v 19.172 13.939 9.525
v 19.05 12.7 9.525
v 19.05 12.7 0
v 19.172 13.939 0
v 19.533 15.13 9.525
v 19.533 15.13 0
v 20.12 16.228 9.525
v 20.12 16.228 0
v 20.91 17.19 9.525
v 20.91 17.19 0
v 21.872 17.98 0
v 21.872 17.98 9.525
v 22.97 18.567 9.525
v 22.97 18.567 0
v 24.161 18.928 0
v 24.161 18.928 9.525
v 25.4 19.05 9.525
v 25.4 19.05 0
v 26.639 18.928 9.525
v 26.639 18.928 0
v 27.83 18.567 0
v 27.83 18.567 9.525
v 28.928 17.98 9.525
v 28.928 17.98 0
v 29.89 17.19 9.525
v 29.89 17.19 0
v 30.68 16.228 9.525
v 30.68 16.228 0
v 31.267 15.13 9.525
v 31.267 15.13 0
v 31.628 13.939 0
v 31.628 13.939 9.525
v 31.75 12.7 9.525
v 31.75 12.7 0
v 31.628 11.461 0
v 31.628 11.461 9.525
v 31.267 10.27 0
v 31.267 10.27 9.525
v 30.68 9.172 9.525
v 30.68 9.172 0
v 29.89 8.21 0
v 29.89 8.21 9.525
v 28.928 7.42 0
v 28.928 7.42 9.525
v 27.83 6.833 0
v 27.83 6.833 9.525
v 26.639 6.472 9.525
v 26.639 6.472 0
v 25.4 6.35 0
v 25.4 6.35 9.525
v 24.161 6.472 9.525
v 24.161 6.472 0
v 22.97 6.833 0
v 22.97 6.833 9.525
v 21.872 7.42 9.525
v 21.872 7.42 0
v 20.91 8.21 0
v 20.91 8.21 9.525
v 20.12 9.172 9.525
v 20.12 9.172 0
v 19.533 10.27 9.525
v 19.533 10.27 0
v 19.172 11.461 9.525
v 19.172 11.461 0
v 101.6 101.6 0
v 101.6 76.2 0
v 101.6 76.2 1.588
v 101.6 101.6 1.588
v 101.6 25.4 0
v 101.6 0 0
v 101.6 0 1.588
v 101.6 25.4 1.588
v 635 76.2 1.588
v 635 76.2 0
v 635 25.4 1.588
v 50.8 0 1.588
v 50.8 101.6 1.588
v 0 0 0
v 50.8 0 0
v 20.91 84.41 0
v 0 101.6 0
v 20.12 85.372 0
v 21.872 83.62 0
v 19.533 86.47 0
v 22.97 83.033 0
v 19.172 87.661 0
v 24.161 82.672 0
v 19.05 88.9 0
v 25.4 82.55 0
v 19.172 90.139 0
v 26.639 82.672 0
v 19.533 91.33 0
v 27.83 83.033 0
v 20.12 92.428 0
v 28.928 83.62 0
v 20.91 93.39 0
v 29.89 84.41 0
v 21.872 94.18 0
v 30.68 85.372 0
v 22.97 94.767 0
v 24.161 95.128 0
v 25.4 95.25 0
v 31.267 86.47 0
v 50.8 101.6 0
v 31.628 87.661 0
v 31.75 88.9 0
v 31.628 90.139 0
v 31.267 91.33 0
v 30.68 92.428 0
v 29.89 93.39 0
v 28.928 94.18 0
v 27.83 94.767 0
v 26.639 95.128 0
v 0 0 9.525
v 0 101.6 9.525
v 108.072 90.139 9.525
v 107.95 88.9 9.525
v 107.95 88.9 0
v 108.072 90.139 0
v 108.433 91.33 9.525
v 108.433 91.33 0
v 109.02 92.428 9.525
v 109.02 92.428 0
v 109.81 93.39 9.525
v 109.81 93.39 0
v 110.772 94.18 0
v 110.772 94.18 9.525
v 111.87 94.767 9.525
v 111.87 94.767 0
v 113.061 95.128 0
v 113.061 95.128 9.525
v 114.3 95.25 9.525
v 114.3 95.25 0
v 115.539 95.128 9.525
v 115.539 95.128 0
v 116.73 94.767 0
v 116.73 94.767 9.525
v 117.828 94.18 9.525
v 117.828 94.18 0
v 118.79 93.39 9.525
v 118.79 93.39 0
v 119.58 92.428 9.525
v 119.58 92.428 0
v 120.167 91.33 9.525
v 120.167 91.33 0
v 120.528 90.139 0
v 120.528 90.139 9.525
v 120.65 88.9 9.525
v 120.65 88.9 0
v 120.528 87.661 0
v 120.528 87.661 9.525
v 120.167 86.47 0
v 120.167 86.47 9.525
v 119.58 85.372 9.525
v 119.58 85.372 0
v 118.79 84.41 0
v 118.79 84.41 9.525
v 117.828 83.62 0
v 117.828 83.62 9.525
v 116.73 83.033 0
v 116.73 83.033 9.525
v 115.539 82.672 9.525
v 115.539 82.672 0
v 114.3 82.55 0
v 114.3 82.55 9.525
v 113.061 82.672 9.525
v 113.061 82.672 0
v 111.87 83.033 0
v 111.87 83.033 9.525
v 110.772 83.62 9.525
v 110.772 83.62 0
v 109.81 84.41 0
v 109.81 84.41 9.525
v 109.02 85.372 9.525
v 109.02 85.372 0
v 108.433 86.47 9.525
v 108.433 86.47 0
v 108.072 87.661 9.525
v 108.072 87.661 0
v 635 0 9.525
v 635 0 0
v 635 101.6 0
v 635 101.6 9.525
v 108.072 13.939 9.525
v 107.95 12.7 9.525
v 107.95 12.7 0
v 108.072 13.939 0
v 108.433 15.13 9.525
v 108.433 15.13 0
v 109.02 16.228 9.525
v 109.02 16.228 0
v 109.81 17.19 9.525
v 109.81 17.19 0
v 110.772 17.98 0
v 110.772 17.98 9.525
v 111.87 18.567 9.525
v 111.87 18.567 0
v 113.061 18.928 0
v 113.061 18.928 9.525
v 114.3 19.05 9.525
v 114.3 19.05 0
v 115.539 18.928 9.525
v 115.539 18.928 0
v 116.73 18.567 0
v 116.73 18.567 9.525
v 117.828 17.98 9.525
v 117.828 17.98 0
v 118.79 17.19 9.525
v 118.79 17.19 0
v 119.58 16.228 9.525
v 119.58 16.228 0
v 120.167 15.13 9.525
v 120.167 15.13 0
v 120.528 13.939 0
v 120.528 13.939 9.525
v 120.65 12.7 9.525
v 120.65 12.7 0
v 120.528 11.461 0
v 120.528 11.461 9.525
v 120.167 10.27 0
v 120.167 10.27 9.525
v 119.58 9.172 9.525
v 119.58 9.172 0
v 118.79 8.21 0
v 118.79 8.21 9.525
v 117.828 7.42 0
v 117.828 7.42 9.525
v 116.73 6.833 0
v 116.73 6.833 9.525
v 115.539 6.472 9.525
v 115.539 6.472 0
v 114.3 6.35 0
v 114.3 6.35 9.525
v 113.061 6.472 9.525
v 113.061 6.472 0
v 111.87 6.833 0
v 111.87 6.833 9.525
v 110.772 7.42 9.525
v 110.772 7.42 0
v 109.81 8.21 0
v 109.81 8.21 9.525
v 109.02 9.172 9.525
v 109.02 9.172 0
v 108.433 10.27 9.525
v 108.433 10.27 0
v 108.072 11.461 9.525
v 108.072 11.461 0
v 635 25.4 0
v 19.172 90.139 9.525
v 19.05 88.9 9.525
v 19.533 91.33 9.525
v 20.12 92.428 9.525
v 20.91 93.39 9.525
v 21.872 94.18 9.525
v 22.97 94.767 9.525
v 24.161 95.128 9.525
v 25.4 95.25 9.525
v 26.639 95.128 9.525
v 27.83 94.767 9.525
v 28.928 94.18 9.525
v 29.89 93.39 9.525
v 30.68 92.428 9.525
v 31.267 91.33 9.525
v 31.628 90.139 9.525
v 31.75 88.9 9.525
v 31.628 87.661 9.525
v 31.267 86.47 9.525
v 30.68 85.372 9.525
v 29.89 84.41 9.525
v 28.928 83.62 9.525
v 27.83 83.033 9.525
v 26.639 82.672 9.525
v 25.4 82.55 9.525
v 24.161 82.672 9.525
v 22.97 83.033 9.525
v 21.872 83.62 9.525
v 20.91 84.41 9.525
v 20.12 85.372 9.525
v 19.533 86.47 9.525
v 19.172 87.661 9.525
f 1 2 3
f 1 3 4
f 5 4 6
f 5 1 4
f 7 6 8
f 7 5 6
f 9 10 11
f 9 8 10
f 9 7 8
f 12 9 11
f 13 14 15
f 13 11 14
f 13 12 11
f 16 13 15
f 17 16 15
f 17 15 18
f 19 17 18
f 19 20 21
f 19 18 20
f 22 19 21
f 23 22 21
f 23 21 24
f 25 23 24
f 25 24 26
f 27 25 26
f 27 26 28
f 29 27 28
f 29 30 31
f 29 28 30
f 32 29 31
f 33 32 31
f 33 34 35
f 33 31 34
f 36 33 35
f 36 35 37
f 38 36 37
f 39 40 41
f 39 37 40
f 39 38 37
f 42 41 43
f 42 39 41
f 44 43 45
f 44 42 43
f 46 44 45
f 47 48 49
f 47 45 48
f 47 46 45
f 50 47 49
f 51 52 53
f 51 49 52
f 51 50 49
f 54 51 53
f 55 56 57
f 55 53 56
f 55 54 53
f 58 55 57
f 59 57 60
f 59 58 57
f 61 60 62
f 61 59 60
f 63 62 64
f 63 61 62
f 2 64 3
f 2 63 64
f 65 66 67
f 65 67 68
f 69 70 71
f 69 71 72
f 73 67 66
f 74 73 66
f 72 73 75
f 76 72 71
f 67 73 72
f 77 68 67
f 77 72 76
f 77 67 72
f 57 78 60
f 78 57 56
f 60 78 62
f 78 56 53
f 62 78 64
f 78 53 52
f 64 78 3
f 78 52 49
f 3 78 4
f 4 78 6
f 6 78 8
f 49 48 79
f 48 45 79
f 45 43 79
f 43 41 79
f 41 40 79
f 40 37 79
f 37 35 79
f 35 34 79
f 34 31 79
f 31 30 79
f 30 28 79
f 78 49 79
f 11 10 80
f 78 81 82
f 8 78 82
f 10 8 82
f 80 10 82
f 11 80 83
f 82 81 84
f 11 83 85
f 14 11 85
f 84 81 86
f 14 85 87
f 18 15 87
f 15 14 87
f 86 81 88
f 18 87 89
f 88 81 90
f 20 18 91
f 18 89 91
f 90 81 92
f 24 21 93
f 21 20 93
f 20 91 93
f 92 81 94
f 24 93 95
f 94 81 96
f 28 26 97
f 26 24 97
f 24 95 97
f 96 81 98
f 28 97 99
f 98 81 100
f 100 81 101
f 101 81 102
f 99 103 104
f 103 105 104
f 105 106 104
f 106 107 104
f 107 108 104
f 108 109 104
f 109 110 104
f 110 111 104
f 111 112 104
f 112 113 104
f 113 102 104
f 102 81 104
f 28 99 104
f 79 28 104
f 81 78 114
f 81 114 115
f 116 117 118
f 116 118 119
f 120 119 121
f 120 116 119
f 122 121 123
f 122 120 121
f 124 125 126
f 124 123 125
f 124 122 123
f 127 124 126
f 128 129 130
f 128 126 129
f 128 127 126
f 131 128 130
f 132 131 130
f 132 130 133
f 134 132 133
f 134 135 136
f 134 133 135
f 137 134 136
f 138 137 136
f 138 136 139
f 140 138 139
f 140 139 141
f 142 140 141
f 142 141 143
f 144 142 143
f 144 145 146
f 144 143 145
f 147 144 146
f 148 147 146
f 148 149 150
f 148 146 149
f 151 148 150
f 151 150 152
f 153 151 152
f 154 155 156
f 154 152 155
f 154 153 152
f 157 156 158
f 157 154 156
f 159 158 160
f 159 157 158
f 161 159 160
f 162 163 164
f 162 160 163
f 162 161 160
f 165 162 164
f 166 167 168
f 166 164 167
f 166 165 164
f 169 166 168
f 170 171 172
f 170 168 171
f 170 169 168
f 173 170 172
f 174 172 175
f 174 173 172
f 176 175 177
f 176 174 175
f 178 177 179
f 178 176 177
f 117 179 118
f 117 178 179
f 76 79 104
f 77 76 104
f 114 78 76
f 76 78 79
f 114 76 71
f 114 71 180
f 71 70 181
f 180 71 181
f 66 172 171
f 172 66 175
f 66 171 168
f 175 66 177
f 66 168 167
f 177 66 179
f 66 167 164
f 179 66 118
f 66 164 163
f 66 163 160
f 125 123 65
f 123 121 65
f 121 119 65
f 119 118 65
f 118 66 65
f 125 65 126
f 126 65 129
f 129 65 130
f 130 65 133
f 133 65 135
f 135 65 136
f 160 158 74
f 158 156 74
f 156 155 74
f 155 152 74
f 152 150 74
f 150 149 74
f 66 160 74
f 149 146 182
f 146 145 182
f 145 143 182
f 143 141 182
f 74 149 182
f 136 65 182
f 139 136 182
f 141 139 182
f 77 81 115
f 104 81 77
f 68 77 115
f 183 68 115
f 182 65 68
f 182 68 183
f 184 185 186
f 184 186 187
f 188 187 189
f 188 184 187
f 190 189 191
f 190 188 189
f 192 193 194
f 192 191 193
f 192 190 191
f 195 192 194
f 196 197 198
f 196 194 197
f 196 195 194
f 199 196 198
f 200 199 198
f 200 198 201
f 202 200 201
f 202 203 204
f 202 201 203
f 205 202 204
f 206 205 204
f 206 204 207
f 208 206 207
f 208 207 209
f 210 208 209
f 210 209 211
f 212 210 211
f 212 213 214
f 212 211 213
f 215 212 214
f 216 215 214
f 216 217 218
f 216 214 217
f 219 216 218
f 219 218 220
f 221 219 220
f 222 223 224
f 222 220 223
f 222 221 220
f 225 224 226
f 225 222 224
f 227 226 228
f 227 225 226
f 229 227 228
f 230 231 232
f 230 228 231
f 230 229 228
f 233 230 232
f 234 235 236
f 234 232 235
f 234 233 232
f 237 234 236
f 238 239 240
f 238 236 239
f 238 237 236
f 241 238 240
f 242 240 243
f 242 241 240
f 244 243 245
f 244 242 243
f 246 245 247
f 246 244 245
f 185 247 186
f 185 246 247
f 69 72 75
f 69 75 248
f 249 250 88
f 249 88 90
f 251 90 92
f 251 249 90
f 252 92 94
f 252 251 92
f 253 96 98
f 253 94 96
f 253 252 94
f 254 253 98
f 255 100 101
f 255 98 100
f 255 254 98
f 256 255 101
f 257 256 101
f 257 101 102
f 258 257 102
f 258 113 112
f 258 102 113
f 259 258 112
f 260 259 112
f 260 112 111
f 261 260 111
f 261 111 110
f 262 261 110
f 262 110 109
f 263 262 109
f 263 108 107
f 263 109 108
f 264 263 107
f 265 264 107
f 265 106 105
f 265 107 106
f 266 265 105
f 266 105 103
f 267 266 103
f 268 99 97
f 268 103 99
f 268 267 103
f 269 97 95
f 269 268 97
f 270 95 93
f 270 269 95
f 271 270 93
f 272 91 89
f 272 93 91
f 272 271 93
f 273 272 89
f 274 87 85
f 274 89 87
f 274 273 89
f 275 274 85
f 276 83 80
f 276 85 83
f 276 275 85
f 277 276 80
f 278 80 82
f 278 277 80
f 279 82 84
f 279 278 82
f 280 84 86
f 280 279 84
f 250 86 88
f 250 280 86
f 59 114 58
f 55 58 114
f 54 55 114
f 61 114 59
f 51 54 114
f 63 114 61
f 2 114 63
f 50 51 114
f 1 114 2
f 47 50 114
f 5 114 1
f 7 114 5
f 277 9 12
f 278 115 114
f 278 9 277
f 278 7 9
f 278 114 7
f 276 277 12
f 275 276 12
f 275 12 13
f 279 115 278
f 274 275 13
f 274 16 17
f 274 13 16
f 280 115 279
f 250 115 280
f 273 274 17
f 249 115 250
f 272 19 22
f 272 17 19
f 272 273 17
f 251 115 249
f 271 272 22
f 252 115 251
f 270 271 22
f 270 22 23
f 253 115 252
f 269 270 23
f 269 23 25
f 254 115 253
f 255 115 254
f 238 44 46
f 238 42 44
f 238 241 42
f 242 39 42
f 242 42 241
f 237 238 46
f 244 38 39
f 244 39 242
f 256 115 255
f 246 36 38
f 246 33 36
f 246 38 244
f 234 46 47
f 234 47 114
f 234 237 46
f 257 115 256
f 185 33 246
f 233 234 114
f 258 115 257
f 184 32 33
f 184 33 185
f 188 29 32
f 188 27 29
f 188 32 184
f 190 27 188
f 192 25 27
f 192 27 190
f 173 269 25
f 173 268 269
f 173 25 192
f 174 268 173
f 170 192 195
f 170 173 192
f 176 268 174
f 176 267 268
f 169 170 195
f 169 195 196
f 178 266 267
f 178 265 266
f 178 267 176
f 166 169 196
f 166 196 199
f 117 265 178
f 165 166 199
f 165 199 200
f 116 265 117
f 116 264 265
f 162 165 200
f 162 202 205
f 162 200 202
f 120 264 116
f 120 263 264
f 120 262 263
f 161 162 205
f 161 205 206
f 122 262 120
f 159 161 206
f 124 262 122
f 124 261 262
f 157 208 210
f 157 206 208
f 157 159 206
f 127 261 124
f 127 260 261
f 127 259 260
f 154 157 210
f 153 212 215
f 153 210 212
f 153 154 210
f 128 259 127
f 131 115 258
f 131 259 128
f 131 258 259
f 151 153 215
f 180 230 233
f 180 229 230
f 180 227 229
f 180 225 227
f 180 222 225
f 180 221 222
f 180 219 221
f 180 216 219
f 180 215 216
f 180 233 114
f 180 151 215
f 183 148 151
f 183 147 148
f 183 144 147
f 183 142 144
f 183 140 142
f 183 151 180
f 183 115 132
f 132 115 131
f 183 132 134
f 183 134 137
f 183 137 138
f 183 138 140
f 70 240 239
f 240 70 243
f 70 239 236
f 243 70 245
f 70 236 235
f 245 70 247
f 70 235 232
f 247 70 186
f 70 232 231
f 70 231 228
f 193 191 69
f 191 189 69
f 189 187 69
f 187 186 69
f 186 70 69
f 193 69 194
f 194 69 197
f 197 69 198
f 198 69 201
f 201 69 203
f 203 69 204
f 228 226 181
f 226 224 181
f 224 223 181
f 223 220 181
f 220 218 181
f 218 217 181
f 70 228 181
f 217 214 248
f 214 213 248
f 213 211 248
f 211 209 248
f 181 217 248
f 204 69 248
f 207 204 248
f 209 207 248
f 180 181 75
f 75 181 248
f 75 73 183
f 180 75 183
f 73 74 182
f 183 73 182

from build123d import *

# Parameters (mm, degrees)
SKETCH1_W               = 635
SKETCH1_H               = 101.6
BOSS_EXTRUDE1_DEPTH     = 9.525
CUT_EXTRUDE1_DEPTH      = 644.147172601
CUT_EXTRUDE1_DEPTH_BACK = 9.525
CUT_EXTRUDE1_START      = 60.325
SKETCH2_W               = 1.5875
SKETCH2_H               = 50.8
CUT_EXTRUDE4_DEPTH      = 644.147172601
CUT_EXTRUDE4_DEPTH_BACK = 644.147172601
SKETCH3_R               = 6.35
SKETCH5_W               = 50.8
SKETCH5_H               = 101.6
CUT_EXTRUDE5_DEPTH      = 1.5875


with BuildPart() as part:
    # Sketch1 → Boss-Extrude1 (new body)
    with BuildSketch(Plane.XY):
        with Locations((317.5, 50.8)):
            Rectangle(SKETCH1_W, SKETCH1_H)
    extrude(amount=BOSS_EXTRUDE1_DEPTH)

    # Sketch2 → Cut-Extrude1 (cut, two sides: drawn at the far end of the back side and taken through both)
    with BuildSketch(Plane(origin=(0, 0, 0), x_dir=(0, 0, -1), z_dir=(1, 0, 0)).offset(CUT_EXTRUDE1_START - CUT_EXTRUDE1_DEPTH_BACK)):
        with Locations((-0.79375, 50.8)):
            Rectangle(SKETCH2_W, SKETCH2_H)
    extrude(amount=CUT_EXTRUDE1_DEPTH + CUT_EXTRUDE1_DEPTH_BACK, mode=Mode.SUBTRACT)

    # Sketch3 → Cut-Extrude4 (cut, two sides: drawn at the far end of the back side and taken through both)
    with BuildSketch(Plane(origin=(0, 0, 0), x_dir=(-1, 0, 0), z_dir=(0, 0, -1)).offset(-CUT_EXTRUDE4_DEPTH_BACK)):
        with Locations((-25.4, 88.9)):
            Circle(SKETCH3_R)
        with Locations((-114.3, 88.9)):
            Circle(SKETCH3_R)
        with Locations((-114.3, 12.7)):
            Circle(SKETCH3_R)
        with Locations((-25.4, 12.7)):
            Circle(SKETCH3_R)
    extrude(amount=CUT_EXTRUDE4_DEPTH + CUT_EXTRUDE4_DEPTH_BACK, mode=Mode.SUBTRACT)

    # Sketch5 → Cut-Extrude5 (cut)
    with BuildSketch(Plane(origin=(0, 0, 0), x_dir=(-1, 0, 0), z_dir=(0, 0, -1))):
        with Locations((-76.2, 50.8)):
            Rectangle(SKETCH5_W, SKETCH5_H)
    extrude(amount=-CUT_EXTRUDE5_DEPTH, mode=Mode.SUBTRACT)


solid = part.part
